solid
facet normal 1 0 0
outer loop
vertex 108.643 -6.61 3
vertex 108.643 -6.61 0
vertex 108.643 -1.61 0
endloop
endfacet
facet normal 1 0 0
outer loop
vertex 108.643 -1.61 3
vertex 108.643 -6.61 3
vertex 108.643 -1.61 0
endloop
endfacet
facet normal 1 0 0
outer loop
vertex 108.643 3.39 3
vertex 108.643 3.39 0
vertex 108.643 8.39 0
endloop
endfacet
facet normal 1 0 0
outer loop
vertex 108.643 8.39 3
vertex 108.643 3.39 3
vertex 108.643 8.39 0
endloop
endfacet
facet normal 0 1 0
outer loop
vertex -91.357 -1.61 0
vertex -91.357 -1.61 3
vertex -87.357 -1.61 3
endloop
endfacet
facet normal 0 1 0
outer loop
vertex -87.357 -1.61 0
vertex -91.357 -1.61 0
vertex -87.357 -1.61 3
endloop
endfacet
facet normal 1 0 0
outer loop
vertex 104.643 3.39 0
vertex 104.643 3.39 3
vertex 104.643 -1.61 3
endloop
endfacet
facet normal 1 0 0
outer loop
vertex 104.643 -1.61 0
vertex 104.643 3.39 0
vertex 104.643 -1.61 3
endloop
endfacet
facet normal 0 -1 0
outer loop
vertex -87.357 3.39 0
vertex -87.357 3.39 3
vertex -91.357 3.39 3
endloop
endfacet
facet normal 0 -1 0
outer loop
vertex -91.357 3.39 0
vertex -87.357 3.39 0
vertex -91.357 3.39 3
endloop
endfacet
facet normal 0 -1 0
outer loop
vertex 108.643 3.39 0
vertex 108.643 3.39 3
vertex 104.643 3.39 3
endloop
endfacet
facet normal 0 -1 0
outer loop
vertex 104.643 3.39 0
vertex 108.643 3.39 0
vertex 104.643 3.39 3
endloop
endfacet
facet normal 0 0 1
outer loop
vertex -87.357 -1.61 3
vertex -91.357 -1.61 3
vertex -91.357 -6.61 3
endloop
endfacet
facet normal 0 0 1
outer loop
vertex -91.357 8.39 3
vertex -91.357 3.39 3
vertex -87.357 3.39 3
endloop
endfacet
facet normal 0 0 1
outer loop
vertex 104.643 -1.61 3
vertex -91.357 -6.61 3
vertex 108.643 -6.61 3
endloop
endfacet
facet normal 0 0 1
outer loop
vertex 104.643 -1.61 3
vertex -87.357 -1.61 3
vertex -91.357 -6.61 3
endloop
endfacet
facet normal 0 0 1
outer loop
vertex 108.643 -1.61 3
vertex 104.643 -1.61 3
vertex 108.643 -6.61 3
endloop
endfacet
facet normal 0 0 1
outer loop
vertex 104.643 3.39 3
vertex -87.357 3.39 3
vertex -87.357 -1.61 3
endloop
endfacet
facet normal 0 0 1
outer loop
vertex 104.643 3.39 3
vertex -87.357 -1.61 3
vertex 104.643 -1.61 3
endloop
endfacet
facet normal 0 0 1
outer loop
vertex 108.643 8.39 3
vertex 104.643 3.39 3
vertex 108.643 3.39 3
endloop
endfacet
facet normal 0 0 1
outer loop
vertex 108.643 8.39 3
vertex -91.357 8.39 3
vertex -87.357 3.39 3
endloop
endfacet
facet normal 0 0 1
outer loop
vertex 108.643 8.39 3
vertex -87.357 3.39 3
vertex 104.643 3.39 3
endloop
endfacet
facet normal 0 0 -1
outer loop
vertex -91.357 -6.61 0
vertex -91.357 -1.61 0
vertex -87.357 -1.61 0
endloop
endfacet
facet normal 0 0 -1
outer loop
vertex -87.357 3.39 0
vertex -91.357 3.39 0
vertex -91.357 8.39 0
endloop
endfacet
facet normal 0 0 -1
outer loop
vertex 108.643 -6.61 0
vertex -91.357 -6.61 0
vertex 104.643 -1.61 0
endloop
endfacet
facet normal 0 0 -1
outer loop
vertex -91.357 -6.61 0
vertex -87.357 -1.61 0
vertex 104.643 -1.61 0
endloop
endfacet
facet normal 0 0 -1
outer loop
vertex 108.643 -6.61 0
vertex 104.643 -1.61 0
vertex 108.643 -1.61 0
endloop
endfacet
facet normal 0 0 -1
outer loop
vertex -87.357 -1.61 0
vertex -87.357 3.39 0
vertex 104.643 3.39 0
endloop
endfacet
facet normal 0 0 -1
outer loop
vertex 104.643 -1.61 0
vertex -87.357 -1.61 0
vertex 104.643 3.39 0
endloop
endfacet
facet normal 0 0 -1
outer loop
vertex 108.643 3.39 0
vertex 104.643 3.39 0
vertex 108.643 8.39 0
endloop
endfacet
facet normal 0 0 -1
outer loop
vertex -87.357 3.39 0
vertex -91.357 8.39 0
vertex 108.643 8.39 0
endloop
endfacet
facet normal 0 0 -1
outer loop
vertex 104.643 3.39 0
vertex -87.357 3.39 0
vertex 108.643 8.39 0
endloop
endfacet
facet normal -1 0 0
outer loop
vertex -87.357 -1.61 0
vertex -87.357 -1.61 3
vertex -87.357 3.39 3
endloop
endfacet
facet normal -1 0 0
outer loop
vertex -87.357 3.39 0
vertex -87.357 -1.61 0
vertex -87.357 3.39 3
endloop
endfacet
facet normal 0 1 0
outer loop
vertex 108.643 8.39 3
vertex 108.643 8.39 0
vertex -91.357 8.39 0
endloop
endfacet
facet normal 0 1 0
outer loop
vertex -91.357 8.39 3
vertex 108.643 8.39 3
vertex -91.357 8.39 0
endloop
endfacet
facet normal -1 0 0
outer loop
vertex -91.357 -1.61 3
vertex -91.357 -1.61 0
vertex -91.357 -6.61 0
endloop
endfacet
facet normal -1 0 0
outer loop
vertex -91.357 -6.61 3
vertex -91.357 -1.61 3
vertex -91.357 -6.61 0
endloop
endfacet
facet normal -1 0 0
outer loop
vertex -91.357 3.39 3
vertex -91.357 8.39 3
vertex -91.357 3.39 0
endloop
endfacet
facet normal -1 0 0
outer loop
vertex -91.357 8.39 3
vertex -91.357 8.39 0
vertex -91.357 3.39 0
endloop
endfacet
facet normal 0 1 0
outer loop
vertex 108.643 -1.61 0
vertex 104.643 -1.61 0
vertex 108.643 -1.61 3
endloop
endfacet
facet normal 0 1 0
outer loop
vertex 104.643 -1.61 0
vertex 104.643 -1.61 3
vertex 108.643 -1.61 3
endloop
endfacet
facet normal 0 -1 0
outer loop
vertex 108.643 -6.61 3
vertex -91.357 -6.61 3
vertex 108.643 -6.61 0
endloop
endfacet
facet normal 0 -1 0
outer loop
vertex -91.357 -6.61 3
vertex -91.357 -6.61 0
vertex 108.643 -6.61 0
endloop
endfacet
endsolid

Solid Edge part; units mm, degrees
sketch "Sketch1" plane through (0, 0, 0) normal (0, 0, 1) x (1, 0, 0)
  line L0 (-91.3574, -6.6098) -> (108.6426, -6.6098)
  line L1 (108.6426, -6.6098) -> (108.6426, 8.3902)
  line L2 (108.6426, 8.3902) -> (-91.3574, 8.3902)
  line L3 (-91.3574, 8.3902) -> (-91.3574, -6.6098)
extrude "Protrusion1" add sketch "Sketch1" along normal blind 3
sketch "Sketch2" plane through (8.6426, 0.8902, 3) normal (0, 0, 1) x (1, 0, 0)
  line L0 (96, -2.5) -> (100, -2.5)
  line L1 (100, -2.5) -> (100, 2.5)
  line L2 (100, 2.5) -> (96, 2.5)
  line L3 (96, 2.5) -> (96, -2.5)
  line L4 (-100, -2.5) -> (-96, -2.5)
  line L5 (-96, -2.5) -> (-96, 2.5)
  line L6 (-96, 2.5) -> (-100, 2.5)
  line L7 (-100, 2.5) -> (-100, -2.5)
  dimension "D1" = 5
  dimension "D2" = 4
  dimension "D3" = 5
  dimension "D4" = 5
  dimension "D5" = 4
  dimension "D6" = 5
extrude "Cutout1" cut sketch "Sketch2" against normal through all
